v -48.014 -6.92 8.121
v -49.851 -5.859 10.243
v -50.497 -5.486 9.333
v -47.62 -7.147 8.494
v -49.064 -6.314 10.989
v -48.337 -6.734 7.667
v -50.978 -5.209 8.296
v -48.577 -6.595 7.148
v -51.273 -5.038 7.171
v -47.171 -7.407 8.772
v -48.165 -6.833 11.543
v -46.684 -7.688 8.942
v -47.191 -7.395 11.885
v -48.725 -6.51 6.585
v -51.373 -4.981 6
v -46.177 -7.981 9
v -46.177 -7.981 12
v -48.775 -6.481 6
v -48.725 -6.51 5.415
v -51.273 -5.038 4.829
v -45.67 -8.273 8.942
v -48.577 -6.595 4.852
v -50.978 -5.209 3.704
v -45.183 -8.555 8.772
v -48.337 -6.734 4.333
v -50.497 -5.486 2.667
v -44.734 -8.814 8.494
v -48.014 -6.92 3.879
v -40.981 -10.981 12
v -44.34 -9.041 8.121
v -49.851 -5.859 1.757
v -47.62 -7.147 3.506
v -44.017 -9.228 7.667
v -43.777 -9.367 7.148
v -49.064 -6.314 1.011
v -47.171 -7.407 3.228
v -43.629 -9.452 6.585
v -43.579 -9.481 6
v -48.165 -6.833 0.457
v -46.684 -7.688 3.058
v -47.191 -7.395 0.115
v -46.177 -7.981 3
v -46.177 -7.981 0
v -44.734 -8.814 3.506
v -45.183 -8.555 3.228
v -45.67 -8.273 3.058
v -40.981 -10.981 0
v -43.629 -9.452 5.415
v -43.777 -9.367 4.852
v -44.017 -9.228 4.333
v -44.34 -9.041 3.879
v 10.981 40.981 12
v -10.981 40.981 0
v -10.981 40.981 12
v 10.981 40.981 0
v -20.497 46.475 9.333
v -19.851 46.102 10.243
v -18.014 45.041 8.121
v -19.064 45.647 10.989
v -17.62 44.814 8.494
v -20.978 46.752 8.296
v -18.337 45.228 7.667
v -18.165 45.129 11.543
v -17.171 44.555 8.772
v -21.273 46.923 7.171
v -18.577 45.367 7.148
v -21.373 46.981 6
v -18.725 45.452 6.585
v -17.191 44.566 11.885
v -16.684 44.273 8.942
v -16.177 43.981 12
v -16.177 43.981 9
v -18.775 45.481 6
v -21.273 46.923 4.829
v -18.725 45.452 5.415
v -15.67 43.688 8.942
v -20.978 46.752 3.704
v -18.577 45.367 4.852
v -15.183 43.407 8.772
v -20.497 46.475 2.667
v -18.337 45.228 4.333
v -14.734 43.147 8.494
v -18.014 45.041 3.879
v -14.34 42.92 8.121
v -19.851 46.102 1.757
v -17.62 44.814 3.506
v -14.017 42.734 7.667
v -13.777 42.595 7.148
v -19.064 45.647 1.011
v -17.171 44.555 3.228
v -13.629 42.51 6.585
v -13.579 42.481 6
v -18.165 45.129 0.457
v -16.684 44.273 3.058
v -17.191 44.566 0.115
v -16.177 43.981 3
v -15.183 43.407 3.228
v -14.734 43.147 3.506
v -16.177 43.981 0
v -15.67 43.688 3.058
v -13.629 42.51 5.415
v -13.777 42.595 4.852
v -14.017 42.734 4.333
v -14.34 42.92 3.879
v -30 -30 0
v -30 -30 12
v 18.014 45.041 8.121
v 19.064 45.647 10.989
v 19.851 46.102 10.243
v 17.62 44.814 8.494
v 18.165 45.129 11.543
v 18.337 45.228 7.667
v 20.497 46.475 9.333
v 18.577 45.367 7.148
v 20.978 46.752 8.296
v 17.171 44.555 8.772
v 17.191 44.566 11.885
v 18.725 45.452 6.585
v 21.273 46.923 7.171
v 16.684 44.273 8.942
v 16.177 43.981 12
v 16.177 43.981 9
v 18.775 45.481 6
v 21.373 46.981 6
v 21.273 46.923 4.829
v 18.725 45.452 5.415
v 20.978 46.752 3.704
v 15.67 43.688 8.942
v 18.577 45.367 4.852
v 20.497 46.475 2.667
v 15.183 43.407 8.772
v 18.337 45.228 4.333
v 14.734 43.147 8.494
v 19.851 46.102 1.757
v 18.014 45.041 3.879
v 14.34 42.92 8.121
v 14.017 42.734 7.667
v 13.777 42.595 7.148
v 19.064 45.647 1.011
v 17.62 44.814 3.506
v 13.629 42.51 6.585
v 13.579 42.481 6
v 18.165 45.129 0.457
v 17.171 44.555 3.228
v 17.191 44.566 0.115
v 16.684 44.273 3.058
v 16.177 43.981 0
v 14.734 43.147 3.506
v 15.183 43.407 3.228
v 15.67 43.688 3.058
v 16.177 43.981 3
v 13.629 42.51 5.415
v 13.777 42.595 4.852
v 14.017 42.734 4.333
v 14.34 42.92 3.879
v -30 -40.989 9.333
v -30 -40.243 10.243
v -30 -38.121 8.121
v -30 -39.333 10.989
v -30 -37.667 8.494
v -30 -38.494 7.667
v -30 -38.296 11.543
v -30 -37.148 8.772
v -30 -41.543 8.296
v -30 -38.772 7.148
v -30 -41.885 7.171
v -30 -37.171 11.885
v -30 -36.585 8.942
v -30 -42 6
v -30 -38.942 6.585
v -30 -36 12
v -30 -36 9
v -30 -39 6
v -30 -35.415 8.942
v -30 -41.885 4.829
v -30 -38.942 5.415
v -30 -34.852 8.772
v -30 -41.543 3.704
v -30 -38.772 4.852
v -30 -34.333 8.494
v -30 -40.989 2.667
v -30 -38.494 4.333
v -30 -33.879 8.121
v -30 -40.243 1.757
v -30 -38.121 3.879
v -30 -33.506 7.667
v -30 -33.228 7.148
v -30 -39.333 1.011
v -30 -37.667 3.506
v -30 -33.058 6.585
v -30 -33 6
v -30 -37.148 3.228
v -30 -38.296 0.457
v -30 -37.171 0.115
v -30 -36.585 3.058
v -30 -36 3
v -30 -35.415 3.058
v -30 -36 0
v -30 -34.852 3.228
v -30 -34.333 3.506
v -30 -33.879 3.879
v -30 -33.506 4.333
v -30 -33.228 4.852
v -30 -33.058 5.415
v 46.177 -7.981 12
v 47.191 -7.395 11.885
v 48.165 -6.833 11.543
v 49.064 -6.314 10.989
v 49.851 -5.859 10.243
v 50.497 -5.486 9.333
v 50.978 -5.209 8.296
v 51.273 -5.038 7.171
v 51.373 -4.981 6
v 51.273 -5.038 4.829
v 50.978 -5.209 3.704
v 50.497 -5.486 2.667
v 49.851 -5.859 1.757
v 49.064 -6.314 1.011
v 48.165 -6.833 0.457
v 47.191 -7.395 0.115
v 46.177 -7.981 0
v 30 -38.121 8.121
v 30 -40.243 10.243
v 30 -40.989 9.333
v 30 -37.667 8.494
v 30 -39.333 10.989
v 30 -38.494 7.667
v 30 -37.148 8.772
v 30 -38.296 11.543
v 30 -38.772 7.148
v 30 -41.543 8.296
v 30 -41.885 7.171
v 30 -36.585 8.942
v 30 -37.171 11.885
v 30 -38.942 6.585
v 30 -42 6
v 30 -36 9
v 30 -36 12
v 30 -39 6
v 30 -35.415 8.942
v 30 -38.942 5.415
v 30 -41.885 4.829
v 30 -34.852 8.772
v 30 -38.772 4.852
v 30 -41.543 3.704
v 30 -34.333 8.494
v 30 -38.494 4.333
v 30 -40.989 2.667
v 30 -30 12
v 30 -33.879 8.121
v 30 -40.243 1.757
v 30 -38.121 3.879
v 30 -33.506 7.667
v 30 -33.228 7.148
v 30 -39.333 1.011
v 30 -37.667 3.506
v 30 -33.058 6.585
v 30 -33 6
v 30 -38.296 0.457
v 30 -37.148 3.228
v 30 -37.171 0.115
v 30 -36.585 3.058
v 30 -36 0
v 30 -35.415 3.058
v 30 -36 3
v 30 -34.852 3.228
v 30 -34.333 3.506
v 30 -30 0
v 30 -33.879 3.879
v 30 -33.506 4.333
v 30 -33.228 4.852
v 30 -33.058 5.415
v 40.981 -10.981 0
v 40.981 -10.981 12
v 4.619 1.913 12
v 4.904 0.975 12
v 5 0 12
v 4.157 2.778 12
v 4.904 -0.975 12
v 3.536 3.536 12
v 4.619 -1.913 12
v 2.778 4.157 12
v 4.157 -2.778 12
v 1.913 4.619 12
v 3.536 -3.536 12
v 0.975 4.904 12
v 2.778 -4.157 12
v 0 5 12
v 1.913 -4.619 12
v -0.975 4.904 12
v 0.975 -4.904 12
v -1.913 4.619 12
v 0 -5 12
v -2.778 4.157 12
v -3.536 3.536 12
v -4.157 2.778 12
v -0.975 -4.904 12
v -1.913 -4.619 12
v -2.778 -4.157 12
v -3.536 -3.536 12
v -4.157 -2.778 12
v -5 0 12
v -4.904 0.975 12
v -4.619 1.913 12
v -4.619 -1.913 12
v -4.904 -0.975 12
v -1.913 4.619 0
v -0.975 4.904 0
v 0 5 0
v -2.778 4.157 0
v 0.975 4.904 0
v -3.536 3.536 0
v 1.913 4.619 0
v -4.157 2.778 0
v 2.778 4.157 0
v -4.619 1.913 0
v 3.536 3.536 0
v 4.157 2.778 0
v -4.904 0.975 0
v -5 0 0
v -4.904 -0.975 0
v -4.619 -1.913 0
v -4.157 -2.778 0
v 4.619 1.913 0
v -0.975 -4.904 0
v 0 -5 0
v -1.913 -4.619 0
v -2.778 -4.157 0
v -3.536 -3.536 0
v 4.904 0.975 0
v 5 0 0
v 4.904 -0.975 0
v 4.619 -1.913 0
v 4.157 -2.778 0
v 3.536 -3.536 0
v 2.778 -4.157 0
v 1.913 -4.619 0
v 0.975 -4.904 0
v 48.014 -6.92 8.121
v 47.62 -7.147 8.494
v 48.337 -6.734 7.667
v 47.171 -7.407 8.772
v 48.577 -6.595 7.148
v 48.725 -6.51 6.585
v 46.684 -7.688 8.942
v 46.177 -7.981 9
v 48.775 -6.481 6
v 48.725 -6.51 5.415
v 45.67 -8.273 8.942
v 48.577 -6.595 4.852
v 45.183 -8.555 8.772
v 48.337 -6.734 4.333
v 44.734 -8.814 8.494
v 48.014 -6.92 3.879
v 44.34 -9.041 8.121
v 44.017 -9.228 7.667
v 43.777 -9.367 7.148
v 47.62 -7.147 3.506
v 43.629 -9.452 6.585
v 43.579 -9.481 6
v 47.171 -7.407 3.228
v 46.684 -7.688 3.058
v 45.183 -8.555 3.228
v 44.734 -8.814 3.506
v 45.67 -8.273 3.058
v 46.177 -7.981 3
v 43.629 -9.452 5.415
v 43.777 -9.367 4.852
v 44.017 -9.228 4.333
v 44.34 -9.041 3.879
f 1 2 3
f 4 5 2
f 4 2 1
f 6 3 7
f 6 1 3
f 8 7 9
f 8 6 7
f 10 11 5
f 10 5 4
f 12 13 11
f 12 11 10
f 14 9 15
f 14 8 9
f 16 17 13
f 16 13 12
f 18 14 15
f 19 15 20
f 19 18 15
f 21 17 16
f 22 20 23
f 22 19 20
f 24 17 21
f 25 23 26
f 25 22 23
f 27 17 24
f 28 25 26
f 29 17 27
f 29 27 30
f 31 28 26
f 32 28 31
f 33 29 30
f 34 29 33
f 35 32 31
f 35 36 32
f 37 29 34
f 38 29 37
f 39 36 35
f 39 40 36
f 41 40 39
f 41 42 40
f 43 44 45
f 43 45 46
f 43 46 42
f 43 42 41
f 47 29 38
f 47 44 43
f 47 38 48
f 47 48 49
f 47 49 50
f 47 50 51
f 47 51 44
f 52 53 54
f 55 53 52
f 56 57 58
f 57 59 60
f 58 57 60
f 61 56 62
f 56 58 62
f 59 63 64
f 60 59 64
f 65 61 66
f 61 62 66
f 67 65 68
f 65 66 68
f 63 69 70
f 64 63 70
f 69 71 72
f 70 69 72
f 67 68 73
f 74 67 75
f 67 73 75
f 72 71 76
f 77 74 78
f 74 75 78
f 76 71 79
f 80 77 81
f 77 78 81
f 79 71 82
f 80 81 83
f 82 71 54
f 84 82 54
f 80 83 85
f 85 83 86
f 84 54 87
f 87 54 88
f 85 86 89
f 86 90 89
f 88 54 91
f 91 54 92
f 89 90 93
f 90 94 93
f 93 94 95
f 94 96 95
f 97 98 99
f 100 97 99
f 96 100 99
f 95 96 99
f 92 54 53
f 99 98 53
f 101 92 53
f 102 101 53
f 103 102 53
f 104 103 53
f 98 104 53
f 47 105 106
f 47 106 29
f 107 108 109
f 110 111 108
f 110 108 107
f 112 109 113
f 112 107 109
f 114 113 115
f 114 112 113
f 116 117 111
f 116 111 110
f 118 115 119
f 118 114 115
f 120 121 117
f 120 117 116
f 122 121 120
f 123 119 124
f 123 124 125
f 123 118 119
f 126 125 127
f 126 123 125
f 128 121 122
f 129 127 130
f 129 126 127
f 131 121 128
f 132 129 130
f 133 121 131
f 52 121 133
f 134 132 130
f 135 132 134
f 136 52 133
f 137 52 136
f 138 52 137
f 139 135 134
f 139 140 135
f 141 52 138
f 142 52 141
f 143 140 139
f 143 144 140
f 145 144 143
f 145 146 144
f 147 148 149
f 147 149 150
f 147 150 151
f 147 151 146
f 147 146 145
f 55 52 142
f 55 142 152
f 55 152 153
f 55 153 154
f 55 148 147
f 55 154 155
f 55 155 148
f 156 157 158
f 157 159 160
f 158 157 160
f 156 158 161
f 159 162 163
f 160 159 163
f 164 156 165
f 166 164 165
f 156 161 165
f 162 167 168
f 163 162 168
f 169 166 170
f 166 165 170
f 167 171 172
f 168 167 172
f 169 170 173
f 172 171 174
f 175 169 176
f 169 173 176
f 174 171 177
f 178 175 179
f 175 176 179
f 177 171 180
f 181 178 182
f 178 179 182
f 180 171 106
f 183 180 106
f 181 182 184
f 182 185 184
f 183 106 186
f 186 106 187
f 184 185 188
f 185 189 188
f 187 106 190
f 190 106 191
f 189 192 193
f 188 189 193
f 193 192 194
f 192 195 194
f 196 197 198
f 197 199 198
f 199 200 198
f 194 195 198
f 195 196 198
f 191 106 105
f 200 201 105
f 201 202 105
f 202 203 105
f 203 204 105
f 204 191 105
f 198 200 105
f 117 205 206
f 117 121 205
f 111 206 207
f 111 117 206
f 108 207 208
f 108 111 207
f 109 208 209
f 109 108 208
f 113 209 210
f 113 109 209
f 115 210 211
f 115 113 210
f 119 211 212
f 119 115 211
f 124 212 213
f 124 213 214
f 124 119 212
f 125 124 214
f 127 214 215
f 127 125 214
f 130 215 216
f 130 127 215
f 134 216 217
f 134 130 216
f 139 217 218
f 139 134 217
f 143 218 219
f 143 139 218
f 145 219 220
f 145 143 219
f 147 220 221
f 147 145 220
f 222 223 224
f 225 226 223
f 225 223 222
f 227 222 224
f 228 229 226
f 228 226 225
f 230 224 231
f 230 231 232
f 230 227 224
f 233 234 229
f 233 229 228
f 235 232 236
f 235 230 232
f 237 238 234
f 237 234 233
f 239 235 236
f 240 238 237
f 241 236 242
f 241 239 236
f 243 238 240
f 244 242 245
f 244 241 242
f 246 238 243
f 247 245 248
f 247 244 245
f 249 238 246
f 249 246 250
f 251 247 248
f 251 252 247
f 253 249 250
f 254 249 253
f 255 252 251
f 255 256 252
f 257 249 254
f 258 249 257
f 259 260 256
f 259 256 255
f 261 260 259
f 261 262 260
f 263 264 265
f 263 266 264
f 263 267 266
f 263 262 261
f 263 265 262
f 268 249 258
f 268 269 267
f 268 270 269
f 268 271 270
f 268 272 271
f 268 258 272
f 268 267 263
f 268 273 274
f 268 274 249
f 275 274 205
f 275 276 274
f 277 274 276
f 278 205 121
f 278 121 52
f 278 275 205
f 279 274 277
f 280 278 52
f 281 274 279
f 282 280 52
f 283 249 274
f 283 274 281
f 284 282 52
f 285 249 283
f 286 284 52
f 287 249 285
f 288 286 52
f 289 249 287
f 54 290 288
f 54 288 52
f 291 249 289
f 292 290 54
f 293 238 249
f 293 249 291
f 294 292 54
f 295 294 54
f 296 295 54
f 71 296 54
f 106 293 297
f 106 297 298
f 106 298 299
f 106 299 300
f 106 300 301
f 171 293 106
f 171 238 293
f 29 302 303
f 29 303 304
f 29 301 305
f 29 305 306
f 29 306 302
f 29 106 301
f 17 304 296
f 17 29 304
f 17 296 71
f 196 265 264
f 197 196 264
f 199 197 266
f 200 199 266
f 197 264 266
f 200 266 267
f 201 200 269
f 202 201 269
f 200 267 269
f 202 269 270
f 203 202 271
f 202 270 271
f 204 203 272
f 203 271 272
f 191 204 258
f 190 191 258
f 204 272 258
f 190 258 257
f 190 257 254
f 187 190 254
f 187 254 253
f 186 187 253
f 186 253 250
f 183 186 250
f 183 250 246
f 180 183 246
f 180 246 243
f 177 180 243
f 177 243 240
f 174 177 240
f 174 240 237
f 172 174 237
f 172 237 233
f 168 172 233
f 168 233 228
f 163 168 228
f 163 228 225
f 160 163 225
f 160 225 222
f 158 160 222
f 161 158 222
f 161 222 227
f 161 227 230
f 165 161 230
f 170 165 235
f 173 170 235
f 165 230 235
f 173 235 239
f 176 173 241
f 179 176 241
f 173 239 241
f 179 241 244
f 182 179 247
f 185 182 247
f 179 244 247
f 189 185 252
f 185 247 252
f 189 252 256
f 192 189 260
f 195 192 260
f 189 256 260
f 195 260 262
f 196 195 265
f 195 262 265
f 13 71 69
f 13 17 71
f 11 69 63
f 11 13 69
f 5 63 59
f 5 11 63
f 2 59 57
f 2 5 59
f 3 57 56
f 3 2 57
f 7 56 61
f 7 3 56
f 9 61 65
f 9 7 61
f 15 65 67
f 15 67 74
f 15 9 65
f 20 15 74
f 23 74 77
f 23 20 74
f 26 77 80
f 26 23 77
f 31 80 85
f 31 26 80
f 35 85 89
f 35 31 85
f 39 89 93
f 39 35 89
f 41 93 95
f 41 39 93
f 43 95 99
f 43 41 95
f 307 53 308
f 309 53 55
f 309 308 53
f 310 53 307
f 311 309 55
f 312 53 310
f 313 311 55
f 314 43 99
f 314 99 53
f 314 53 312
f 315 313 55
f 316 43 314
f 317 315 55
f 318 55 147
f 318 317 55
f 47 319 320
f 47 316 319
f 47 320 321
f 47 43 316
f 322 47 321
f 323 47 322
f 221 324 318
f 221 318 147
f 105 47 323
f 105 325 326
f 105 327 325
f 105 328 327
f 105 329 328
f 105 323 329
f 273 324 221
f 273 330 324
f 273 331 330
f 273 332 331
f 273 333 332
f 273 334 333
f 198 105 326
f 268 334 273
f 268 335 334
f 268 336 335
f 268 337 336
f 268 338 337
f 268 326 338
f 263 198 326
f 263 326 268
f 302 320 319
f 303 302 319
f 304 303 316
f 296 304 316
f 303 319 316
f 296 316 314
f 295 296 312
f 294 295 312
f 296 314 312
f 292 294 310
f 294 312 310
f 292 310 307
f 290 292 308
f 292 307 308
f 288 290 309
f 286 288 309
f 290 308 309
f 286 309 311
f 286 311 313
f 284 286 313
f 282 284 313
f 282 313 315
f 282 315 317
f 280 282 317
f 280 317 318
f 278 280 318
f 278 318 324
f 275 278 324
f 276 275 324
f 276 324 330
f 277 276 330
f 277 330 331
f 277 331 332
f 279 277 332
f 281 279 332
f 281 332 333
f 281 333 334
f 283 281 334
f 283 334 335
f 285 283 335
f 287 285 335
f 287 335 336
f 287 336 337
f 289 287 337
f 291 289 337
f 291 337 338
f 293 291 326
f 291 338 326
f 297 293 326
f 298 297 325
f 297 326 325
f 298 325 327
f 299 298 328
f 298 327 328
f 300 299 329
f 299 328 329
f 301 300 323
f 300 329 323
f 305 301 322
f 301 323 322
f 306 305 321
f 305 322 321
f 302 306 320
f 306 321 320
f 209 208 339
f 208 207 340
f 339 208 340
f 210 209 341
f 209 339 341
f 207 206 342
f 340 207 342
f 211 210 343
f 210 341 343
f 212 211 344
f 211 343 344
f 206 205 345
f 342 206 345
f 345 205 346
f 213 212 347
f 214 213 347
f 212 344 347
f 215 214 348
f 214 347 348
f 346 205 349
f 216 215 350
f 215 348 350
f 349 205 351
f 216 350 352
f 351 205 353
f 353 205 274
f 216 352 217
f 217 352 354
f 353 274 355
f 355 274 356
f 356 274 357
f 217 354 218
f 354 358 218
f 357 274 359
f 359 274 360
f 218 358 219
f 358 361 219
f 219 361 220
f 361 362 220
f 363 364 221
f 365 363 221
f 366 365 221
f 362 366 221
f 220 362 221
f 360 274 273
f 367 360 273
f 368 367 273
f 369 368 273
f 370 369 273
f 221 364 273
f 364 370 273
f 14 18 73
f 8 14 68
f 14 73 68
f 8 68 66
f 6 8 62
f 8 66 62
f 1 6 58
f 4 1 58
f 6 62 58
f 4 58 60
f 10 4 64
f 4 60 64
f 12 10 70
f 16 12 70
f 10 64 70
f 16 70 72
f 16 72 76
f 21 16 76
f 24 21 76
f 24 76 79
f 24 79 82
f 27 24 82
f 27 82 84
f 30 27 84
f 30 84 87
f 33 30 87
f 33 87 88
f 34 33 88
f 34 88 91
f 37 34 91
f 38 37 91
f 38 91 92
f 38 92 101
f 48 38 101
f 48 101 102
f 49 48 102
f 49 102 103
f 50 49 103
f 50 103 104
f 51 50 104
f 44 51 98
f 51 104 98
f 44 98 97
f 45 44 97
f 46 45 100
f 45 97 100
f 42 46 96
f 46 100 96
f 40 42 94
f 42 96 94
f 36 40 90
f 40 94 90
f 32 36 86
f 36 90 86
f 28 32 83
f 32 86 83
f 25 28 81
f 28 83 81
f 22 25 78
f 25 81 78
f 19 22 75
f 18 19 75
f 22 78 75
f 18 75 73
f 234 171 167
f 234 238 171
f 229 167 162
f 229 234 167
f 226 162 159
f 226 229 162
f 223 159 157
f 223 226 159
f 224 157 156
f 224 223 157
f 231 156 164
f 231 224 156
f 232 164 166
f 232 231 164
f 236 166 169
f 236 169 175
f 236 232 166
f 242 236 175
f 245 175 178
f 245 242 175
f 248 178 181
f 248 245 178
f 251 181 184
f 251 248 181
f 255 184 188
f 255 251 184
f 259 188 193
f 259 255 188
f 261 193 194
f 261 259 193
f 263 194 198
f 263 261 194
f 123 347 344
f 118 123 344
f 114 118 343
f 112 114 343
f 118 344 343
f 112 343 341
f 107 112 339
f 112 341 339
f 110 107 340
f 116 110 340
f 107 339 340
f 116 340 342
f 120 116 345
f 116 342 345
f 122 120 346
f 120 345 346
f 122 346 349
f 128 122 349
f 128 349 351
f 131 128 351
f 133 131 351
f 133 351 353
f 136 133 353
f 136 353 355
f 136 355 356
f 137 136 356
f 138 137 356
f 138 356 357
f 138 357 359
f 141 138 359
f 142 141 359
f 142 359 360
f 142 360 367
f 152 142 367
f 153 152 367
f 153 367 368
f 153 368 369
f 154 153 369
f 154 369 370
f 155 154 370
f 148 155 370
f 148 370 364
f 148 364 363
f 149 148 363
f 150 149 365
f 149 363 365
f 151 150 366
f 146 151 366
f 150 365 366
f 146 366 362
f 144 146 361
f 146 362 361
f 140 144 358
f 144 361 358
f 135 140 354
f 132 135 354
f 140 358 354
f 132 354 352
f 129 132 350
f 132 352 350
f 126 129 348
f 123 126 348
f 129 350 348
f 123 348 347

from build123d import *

# Parameters (mm, degrees)
EXTRUDE_1_DEPTH          = 12
SKETCH_2_R               = 6
EXTRUDE_2_DEPTH          = 30
SKETCH_3_R               = 3
CUT_EXTRUDE_1_DEPTH      = 103.282410285
SKETCH_5_R               = 5
CUT_EXTRUDE_2_DEPTH      = 81.274528962
CUT_EXTRUDE_3_DEPTH      = 81.274528962
PATTERN_CIRCULAR_2_COUNT = 3
SKETCH_7_R               = 3
CUT_EXTRUDE_4_DEPTH      = 100.361803703
SKETCH_8_R               = 3
CUT_EXTRUDE_5_DEPTH      = 96.764127078


with BuildPart() as part:
    # 草图1 → 凸台-拉伸1 (new body)
    with BuildSketch(Plane.XY):
        Polygon((0, 60), (-51.961524227, -30), (51.961524227, -30), align=None)
    extrude(amount=EXTRUDE_1_DEPTH)

    # 草图2 → 凸台-拉伸2 (add, symmetric)
    with BuildSketch(Plane(origin=(0, 0, 0), x_dir=(0, 0, -1), z_dir=(1, 0, 0))):
        with Locations((-6, -36)):
            Circle(SKETCH_2_R)
        with BuildLine():
            ThreePointArc((-6, -30), (-1.757359313, -31.757359313), (0, -36))
            Line((0, -36), (0, -30))
            Line((0, -30), (-6, -30))
        make_face()
        with BuildLine():
            Line((-12, -30), (-12, -36))
            ThreePointArc((-12, -36), (-10.242640687, -31.757359313), (-6, -30))
            Line((-6, -30), (-12, -30))
        make_face()
    extrude_2 = extrude(amount=EXTRUDE_2_DEPTH, both=True)

    # 草图3 → 切除-拉伸1 (cut, through all)
    with BuildSketch(Plane(origin=(30, 0, 0), x_dir=(0, 0, -1), z_dir=(1, 0, 0))):
        with Locations((-6, -36)):
            Circle(SKETCH_3_R)
    extrude(amount=-CUT_EXTRUDE_1_DEPTH, mode=Mode.SUBTRACT)

    # 草图5 → 切除-拉伸2 (cut, through all)
    with BuildSketch(Plane(origin=(0, 0, 0), x_dir=(-1, 0, 0), z_dir=(0, 0, -1))):
        Circle(SKETCH_5_R)
    extrude(amount=-CUT_EXTRUDE_2_DEPTH, mode=Mode.SUBTRACT)

    # 草图6 → 切除-拉伸3 (cut, through all)
    with BuildSketch(Plane(origin=(0, 0, 0), x_dir=(-1, 0, 0), z_dir=(0, 0, -1))):
        Polygon((-30, -30), (-51.961524227, -30), (-40.980762114, -10.980762114), align=None)
        Polygon((10.980762114, 40.980762114), (-10.980762114, 40.980762114), (0, 60), align=None)
        Polygon((30, -30), (40.980762114, -10.980762114), (51.961524227, -30), align=None)
    extrude(amount=-CUT_EXTRUDE_3_DEPTH, mode=Mode.SUBTRACT)

    # 阵列(圆周)2: 凸台-拉伸2 ×3 about axis
    pattern_circular_2_axis = Axis((0, 0, 0), (0, 0, 1))
    for i in range(1, PATTERN_CIRCULAR_2_COUNT):
        add(extrude_2.rotate(pattern_circular_2_axis, i * 360 / PATTERN_CIRCULAR_2_COUNT))

    # 草图7 → 切除-拉伸4 (cut, through all)
    with BuildSketch(Plane(origin=(15, -25.980762114, 0), x_dir=(0.8660254037844434, 0.49999999999999195, 0), z_dir=(0.49999999999999195, -0.8660254037844434, 0))):
        with Locations((36, 6)):
            Circle(SKETCH_7_R)
    extrude(amount=-CUT_EXTRUDE_4_DEPTH, mode=Mode.SUBTRACT)

    # 草图8 → 切除-拉伸5 (cut, through all)
    with BuildSketch(Plane(origin=(15, 25.980762114, 0), x_dir=(0.8660254037844363, -0.5000000000000043, 0), z_dir=(0.5000000000000042, 0.8660254037844362, 0))):
        with Locations(Location((-36, -6, 0), (0, 0, 180))):
            Circle(SKETCH_8_R)
    extrude(amount=-CUT_EXTRUDE_5_DEPTH, mode=Mode.SUBTRACT)


solid = part.part
